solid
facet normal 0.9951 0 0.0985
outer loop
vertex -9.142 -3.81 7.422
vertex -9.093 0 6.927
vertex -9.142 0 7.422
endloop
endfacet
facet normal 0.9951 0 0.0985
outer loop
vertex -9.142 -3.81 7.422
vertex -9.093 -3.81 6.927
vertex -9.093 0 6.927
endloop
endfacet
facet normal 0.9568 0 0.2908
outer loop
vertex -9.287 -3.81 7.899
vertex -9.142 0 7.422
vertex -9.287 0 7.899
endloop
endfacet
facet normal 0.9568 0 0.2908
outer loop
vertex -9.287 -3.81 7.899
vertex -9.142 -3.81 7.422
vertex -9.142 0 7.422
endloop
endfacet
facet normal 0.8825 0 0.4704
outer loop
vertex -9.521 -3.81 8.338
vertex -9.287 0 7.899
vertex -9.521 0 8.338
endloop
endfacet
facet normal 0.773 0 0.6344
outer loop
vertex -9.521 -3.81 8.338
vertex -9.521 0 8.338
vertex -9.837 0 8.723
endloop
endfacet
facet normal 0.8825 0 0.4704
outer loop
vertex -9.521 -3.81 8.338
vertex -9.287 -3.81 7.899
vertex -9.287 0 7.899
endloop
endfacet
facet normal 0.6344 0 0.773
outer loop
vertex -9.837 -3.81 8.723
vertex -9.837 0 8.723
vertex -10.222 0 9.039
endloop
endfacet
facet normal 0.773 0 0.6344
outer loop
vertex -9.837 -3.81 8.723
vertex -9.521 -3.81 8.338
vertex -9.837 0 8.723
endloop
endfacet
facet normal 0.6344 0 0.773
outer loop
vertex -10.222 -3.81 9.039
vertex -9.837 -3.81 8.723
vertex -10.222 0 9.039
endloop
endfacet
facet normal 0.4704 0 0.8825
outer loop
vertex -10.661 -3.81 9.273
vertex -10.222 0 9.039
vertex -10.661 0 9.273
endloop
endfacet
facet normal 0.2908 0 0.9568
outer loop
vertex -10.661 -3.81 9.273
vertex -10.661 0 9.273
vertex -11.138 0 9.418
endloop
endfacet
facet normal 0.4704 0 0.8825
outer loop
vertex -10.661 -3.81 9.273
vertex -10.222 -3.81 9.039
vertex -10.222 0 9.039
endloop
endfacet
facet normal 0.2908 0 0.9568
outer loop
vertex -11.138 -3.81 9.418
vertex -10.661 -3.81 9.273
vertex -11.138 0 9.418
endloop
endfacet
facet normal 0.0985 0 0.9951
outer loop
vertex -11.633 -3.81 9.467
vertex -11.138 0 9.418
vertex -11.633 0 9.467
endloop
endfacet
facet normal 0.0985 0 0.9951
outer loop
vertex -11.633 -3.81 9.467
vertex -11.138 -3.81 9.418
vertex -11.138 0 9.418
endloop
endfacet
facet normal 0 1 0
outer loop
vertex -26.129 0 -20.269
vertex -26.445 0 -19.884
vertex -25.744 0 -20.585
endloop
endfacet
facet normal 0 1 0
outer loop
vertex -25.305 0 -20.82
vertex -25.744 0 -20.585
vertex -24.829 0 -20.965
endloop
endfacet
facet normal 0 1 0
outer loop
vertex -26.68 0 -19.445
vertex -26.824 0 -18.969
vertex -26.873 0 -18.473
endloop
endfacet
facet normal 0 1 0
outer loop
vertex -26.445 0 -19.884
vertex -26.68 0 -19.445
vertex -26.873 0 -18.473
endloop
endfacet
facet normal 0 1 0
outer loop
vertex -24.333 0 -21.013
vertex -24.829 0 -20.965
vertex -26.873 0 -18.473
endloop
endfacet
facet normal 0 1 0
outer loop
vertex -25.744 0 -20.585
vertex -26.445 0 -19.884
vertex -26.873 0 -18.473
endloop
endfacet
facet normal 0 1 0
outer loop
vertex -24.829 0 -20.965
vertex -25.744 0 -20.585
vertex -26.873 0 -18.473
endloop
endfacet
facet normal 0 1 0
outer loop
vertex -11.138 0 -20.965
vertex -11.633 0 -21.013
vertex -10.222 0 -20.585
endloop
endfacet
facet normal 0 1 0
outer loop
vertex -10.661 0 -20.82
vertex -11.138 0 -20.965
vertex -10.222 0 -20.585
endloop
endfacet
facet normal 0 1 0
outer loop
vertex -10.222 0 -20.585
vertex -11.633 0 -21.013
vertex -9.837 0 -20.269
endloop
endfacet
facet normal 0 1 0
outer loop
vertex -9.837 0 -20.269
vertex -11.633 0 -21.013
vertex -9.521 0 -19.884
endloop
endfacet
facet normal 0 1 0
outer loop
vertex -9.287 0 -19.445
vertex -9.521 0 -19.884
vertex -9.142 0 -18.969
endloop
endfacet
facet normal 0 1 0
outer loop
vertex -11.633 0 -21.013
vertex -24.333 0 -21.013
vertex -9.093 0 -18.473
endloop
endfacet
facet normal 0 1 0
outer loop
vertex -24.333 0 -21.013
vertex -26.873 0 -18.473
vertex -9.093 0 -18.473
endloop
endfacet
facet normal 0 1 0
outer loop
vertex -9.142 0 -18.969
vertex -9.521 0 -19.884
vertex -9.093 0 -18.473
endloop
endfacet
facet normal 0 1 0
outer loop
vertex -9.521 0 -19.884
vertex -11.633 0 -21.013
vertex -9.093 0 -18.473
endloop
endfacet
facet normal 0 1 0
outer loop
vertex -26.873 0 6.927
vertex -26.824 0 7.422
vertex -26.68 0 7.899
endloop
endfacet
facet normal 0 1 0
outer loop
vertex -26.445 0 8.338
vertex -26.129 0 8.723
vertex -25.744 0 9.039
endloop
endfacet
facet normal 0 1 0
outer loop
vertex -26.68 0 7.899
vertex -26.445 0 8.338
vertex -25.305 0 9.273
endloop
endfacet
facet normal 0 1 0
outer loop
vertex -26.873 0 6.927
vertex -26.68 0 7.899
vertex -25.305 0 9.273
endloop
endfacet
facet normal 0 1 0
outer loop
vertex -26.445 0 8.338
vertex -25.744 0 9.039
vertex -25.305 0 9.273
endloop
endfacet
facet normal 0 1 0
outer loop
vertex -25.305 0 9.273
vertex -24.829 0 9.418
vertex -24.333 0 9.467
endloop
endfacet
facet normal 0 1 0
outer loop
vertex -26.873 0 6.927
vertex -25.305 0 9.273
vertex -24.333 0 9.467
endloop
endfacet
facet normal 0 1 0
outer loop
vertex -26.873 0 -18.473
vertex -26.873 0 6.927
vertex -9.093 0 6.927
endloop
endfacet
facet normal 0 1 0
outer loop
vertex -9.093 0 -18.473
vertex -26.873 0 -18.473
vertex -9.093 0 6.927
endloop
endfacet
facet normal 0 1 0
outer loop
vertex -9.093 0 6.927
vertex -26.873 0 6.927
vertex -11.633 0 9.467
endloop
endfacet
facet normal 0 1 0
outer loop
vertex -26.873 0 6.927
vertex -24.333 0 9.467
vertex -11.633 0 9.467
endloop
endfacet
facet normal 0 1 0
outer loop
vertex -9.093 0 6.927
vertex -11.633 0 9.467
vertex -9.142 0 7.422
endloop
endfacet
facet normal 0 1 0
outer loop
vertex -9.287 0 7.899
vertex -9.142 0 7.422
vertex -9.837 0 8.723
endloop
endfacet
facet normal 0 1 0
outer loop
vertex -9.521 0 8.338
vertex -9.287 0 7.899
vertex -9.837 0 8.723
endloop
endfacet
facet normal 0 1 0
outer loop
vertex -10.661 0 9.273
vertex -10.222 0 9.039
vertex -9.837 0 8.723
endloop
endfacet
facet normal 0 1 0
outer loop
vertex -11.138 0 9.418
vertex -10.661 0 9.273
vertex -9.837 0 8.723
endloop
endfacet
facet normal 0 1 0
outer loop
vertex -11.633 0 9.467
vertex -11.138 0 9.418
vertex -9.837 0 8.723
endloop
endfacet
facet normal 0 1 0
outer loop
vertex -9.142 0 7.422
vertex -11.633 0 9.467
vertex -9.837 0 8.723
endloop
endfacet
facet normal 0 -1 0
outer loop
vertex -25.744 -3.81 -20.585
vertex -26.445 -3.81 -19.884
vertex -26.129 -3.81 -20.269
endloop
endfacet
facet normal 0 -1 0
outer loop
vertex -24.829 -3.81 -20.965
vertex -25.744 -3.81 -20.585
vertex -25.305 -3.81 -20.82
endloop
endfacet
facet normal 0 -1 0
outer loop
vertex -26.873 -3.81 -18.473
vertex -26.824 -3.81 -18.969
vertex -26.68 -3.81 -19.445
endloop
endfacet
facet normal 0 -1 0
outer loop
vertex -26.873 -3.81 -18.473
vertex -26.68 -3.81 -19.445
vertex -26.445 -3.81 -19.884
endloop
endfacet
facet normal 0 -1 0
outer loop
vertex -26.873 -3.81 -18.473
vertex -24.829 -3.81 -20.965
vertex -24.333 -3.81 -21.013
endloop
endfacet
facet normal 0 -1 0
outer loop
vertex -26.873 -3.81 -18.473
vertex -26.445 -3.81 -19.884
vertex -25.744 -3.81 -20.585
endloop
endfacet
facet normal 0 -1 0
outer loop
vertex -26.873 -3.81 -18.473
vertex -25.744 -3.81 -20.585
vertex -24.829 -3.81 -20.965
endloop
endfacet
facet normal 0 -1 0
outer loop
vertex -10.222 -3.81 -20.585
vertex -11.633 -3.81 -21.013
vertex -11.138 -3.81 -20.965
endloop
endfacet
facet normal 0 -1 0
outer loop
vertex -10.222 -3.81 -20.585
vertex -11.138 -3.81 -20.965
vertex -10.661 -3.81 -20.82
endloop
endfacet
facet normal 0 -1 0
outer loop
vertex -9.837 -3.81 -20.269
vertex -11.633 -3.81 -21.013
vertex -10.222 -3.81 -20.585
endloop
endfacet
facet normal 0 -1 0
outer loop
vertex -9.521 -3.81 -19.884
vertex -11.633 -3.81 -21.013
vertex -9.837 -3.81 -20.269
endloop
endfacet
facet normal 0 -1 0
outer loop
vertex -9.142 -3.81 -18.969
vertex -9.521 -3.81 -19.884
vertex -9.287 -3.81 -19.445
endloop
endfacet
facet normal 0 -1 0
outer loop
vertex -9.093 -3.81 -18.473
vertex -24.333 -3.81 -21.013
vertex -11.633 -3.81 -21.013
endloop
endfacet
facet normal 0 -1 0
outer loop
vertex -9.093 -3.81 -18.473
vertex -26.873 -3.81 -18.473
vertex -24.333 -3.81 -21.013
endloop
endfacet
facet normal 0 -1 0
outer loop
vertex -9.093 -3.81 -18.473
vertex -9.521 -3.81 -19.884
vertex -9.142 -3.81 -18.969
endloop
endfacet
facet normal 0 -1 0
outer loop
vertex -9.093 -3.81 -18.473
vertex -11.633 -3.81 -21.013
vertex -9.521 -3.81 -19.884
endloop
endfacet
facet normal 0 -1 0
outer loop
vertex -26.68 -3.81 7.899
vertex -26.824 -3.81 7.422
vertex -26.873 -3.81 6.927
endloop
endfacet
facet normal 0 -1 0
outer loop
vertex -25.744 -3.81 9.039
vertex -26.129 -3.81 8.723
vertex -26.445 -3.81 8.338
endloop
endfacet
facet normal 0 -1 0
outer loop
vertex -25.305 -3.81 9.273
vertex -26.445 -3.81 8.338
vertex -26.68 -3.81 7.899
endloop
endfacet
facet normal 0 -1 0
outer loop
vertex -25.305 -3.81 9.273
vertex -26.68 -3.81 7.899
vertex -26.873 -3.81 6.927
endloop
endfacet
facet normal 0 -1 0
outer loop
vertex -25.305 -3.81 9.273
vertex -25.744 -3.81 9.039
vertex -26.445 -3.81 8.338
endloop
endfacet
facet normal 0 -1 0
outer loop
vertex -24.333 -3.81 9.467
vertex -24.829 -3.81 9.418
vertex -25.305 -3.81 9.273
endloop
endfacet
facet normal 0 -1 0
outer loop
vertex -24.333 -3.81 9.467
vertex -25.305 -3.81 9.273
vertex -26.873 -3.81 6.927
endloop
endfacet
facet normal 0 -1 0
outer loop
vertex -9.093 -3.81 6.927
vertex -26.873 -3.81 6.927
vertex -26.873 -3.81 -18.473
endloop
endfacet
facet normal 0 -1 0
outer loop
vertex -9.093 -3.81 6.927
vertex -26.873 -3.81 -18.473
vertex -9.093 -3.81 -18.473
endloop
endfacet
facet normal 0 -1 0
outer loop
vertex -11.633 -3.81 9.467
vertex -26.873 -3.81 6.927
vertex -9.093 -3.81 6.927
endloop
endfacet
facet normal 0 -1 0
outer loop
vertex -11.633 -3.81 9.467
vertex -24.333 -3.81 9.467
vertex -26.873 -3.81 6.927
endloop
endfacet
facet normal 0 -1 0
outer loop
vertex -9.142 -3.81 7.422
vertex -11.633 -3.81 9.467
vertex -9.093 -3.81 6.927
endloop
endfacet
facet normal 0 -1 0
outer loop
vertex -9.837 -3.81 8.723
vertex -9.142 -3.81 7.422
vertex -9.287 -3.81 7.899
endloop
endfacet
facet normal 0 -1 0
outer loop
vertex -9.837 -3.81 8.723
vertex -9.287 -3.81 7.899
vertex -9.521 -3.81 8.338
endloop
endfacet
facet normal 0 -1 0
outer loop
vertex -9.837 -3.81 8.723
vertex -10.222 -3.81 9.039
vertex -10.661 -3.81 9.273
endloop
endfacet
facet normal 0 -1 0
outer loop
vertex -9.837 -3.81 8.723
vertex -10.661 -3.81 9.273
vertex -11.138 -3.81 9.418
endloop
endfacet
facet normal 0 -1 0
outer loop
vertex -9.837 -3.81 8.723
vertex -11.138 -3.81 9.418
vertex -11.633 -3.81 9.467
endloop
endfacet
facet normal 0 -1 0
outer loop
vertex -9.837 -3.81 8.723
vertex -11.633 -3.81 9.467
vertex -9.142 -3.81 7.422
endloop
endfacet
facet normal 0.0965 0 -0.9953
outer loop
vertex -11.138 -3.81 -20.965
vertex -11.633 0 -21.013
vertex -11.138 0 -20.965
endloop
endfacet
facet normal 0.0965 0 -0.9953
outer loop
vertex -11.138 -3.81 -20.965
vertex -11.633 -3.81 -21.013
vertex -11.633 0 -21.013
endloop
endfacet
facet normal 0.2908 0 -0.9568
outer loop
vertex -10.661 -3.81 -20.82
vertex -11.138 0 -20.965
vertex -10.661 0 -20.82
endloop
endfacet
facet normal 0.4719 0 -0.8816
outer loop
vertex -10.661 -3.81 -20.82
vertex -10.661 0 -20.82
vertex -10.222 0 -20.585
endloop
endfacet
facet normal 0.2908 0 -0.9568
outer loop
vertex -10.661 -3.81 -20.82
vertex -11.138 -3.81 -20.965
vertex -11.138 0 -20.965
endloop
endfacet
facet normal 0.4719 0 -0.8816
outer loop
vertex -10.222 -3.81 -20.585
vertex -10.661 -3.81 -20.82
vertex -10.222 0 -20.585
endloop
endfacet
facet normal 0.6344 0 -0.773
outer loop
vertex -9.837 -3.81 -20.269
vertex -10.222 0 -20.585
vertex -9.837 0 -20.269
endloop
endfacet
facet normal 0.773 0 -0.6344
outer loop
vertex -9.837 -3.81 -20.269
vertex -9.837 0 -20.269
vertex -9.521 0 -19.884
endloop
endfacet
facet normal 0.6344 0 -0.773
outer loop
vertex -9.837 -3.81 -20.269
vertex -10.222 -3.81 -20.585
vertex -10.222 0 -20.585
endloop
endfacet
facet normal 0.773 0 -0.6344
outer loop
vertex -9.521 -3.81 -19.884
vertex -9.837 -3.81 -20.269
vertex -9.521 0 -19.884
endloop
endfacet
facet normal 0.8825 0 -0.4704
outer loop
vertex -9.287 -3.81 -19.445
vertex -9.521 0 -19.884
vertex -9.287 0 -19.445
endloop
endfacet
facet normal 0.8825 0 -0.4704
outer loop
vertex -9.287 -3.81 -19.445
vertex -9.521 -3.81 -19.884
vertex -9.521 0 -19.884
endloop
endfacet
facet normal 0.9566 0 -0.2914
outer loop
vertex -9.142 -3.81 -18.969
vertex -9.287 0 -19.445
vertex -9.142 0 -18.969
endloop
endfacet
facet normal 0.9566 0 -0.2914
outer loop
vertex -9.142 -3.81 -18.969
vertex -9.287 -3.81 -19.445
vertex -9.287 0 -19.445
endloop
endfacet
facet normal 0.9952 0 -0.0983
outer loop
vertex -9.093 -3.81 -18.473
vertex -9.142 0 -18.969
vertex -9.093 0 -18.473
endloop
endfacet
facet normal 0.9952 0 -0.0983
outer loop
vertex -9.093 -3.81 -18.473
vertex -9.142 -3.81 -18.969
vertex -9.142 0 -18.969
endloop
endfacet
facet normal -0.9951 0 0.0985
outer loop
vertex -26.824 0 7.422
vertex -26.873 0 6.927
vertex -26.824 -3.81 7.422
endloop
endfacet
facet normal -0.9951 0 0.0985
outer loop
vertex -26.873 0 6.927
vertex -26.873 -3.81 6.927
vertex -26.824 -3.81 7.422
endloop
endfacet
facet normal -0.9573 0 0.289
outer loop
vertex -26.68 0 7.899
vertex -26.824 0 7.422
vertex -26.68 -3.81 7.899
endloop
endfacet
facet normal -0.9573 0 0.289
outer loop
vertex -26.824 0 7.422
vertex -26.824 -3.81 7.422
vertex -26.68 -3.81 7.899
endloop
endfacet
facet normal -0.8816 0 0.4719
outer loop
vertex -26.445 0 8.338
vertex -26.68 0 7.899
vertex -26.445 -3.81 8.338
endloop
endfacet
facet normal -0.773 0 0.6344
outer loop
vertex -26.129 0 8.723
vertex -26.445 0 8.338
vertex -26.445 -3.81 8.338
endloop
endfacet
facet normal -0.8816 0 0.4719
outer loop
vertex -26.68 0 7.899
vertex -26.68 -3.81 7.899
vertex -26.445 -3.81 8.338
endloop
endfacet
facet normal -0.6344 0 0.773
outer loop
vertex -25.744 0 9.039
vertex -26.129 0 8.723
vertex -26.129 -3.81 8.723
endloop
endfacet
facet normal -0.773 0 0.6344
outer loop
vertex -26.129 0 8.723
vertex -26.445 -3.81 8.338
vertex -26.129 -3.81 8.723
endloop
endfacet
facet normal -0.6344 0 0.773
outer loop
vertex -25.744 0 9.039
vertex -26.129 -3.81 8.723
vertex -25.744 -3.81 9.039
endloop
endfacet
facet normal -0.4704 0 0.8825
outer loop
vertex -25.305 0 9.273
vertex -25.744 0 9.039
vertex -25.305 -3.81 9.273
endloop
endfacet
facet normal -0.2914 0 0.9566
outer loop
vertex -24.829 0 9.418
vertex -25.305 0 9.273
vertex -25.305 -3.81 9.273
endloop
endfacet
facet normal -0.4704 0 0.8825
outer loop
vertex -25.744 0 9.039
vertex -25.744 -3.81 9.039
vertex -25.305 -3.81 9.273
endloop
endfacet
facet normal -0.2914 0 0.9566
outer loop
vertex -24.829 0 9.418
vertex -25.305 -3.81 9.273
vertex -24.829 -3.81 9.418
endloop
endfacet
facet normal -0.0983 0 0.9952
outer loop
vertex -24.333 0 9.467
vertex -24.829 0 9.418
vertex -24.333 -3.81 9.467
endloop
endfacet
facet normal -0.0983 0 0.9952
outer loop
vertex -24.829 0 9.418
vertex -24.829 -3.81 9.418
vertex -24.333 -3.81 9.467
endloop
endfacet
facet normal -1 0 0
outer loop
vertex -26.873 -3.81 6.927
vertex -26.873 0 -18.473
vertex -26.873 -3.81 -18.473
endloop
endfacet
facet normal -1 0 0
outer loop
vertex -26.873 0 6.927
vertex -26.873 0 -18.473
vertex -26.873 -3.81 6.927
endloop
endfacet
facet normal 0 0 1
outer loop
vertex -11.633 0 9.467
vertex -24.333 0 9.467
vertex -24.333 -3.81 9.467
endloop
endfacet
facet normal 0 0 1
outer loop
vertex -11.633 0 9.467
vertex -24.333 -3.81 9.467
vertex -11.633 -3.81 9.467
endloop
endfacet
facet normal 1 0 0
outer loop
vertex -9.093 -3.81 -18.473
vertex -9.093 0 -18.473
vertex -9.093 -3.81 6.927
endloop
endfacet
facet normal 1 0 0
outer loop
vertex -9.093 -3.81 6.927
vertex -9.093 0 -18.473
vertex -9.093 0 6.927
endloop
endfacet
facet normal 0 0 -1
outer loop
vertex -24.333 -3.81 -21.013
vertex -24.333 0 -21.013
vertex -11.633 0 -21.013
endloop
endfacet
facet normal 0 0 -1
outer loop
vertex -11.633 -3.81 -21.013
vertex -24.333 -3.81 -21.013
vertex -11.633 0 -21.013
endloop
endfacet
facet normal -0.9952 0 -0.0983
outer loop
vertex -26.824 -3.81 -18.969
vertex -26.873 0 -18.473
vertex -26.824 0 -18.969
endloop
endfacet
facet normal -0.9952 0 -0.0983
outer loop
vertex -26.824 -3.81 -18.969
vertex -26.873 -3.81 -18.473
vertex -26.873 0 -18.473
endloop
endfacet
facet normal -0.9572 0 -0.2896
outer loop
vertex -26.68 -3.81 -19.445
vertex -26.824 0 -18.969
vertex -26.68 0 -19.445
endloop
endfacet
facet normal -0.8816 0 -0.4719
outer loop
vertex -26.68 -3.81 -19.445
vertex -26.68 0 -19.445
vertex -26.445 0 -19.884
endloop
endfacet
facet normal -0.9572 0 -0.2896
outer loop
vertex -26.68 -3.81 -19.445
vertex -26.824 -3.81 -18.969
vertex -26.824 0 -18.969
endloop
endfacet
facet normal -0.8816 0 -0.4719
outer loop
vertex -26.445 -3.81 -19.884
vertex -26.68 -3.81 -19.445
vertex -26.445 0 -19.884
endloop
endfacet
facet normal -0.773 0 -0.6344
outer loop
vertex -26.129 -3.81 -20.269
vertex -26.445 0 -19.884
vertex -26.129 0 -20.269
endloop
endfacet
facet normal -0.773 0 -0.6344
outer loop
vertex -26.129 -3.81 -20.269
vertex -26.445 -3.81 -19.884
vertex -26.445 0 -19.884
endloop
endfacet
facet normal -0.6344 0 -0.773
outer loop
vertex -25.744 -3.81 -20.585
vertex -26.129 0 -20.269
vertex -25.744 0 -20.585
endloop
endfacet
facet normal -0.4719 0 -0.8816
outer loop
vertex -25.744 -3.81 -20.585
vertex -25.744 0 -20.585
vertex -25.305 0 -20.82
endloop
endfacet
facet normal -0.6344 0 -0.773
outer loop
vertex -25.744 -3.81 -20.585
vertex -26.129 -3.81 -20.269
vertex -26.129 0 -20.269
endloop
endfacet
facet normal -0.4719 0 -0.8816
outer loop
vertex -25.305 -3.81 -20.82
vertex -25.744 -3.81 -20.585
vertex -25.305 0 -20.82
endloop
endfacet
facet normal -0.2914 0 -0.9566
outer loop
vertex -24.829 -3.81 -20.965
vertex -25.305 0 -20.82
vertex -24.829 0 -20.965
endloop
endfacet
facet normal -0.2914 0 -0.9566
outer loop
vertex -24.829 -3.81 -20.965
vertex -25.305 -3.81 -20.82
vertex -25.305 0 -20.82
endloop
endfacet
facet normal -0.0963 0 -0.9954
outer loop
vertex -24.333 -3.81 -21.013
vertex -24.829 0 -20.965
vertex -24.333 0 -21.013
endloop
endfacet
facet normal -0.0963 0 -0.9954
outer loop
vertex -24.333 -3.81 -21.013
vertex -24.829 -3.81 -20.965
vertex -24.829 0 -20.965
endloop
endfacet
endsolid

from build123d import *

# Parameters (mm, degrees)
F0_W     = 17.78
F0_H     = 30.48
F1_DEPTH = 3.81
F2_R     = 2.54
F3_R     = 2.54


with BuildPart() as f1:
    # F0 (on Front) → F1 (new body)
    with BuildSketch(Plane.XZ):
        with Locations((-17.9832, -5.773323)):
            Rectangle(F0_W, F0_H)
    extrude(amount=F1_DEPTH)

    # F2
    f2_edges = [f1.edges().sort_by_distance(p)[0] for p in [
        (-9.0932, -1.905, 9.466677),
        (-26.8732, -1.905, 9.466677),
    ]]
    fillet(f2_edges, radius=F2_R)

    # F3
    f3_edges = [f1.edges().sort_by_distance(p)[0] for p in [
        (-26.8732, -1.905, -21.013323),
        (-9.0932, -1.905, -21.013323),
    ]]
    fillet(f3_edges, radius=F3_R)


solid = f1.part
